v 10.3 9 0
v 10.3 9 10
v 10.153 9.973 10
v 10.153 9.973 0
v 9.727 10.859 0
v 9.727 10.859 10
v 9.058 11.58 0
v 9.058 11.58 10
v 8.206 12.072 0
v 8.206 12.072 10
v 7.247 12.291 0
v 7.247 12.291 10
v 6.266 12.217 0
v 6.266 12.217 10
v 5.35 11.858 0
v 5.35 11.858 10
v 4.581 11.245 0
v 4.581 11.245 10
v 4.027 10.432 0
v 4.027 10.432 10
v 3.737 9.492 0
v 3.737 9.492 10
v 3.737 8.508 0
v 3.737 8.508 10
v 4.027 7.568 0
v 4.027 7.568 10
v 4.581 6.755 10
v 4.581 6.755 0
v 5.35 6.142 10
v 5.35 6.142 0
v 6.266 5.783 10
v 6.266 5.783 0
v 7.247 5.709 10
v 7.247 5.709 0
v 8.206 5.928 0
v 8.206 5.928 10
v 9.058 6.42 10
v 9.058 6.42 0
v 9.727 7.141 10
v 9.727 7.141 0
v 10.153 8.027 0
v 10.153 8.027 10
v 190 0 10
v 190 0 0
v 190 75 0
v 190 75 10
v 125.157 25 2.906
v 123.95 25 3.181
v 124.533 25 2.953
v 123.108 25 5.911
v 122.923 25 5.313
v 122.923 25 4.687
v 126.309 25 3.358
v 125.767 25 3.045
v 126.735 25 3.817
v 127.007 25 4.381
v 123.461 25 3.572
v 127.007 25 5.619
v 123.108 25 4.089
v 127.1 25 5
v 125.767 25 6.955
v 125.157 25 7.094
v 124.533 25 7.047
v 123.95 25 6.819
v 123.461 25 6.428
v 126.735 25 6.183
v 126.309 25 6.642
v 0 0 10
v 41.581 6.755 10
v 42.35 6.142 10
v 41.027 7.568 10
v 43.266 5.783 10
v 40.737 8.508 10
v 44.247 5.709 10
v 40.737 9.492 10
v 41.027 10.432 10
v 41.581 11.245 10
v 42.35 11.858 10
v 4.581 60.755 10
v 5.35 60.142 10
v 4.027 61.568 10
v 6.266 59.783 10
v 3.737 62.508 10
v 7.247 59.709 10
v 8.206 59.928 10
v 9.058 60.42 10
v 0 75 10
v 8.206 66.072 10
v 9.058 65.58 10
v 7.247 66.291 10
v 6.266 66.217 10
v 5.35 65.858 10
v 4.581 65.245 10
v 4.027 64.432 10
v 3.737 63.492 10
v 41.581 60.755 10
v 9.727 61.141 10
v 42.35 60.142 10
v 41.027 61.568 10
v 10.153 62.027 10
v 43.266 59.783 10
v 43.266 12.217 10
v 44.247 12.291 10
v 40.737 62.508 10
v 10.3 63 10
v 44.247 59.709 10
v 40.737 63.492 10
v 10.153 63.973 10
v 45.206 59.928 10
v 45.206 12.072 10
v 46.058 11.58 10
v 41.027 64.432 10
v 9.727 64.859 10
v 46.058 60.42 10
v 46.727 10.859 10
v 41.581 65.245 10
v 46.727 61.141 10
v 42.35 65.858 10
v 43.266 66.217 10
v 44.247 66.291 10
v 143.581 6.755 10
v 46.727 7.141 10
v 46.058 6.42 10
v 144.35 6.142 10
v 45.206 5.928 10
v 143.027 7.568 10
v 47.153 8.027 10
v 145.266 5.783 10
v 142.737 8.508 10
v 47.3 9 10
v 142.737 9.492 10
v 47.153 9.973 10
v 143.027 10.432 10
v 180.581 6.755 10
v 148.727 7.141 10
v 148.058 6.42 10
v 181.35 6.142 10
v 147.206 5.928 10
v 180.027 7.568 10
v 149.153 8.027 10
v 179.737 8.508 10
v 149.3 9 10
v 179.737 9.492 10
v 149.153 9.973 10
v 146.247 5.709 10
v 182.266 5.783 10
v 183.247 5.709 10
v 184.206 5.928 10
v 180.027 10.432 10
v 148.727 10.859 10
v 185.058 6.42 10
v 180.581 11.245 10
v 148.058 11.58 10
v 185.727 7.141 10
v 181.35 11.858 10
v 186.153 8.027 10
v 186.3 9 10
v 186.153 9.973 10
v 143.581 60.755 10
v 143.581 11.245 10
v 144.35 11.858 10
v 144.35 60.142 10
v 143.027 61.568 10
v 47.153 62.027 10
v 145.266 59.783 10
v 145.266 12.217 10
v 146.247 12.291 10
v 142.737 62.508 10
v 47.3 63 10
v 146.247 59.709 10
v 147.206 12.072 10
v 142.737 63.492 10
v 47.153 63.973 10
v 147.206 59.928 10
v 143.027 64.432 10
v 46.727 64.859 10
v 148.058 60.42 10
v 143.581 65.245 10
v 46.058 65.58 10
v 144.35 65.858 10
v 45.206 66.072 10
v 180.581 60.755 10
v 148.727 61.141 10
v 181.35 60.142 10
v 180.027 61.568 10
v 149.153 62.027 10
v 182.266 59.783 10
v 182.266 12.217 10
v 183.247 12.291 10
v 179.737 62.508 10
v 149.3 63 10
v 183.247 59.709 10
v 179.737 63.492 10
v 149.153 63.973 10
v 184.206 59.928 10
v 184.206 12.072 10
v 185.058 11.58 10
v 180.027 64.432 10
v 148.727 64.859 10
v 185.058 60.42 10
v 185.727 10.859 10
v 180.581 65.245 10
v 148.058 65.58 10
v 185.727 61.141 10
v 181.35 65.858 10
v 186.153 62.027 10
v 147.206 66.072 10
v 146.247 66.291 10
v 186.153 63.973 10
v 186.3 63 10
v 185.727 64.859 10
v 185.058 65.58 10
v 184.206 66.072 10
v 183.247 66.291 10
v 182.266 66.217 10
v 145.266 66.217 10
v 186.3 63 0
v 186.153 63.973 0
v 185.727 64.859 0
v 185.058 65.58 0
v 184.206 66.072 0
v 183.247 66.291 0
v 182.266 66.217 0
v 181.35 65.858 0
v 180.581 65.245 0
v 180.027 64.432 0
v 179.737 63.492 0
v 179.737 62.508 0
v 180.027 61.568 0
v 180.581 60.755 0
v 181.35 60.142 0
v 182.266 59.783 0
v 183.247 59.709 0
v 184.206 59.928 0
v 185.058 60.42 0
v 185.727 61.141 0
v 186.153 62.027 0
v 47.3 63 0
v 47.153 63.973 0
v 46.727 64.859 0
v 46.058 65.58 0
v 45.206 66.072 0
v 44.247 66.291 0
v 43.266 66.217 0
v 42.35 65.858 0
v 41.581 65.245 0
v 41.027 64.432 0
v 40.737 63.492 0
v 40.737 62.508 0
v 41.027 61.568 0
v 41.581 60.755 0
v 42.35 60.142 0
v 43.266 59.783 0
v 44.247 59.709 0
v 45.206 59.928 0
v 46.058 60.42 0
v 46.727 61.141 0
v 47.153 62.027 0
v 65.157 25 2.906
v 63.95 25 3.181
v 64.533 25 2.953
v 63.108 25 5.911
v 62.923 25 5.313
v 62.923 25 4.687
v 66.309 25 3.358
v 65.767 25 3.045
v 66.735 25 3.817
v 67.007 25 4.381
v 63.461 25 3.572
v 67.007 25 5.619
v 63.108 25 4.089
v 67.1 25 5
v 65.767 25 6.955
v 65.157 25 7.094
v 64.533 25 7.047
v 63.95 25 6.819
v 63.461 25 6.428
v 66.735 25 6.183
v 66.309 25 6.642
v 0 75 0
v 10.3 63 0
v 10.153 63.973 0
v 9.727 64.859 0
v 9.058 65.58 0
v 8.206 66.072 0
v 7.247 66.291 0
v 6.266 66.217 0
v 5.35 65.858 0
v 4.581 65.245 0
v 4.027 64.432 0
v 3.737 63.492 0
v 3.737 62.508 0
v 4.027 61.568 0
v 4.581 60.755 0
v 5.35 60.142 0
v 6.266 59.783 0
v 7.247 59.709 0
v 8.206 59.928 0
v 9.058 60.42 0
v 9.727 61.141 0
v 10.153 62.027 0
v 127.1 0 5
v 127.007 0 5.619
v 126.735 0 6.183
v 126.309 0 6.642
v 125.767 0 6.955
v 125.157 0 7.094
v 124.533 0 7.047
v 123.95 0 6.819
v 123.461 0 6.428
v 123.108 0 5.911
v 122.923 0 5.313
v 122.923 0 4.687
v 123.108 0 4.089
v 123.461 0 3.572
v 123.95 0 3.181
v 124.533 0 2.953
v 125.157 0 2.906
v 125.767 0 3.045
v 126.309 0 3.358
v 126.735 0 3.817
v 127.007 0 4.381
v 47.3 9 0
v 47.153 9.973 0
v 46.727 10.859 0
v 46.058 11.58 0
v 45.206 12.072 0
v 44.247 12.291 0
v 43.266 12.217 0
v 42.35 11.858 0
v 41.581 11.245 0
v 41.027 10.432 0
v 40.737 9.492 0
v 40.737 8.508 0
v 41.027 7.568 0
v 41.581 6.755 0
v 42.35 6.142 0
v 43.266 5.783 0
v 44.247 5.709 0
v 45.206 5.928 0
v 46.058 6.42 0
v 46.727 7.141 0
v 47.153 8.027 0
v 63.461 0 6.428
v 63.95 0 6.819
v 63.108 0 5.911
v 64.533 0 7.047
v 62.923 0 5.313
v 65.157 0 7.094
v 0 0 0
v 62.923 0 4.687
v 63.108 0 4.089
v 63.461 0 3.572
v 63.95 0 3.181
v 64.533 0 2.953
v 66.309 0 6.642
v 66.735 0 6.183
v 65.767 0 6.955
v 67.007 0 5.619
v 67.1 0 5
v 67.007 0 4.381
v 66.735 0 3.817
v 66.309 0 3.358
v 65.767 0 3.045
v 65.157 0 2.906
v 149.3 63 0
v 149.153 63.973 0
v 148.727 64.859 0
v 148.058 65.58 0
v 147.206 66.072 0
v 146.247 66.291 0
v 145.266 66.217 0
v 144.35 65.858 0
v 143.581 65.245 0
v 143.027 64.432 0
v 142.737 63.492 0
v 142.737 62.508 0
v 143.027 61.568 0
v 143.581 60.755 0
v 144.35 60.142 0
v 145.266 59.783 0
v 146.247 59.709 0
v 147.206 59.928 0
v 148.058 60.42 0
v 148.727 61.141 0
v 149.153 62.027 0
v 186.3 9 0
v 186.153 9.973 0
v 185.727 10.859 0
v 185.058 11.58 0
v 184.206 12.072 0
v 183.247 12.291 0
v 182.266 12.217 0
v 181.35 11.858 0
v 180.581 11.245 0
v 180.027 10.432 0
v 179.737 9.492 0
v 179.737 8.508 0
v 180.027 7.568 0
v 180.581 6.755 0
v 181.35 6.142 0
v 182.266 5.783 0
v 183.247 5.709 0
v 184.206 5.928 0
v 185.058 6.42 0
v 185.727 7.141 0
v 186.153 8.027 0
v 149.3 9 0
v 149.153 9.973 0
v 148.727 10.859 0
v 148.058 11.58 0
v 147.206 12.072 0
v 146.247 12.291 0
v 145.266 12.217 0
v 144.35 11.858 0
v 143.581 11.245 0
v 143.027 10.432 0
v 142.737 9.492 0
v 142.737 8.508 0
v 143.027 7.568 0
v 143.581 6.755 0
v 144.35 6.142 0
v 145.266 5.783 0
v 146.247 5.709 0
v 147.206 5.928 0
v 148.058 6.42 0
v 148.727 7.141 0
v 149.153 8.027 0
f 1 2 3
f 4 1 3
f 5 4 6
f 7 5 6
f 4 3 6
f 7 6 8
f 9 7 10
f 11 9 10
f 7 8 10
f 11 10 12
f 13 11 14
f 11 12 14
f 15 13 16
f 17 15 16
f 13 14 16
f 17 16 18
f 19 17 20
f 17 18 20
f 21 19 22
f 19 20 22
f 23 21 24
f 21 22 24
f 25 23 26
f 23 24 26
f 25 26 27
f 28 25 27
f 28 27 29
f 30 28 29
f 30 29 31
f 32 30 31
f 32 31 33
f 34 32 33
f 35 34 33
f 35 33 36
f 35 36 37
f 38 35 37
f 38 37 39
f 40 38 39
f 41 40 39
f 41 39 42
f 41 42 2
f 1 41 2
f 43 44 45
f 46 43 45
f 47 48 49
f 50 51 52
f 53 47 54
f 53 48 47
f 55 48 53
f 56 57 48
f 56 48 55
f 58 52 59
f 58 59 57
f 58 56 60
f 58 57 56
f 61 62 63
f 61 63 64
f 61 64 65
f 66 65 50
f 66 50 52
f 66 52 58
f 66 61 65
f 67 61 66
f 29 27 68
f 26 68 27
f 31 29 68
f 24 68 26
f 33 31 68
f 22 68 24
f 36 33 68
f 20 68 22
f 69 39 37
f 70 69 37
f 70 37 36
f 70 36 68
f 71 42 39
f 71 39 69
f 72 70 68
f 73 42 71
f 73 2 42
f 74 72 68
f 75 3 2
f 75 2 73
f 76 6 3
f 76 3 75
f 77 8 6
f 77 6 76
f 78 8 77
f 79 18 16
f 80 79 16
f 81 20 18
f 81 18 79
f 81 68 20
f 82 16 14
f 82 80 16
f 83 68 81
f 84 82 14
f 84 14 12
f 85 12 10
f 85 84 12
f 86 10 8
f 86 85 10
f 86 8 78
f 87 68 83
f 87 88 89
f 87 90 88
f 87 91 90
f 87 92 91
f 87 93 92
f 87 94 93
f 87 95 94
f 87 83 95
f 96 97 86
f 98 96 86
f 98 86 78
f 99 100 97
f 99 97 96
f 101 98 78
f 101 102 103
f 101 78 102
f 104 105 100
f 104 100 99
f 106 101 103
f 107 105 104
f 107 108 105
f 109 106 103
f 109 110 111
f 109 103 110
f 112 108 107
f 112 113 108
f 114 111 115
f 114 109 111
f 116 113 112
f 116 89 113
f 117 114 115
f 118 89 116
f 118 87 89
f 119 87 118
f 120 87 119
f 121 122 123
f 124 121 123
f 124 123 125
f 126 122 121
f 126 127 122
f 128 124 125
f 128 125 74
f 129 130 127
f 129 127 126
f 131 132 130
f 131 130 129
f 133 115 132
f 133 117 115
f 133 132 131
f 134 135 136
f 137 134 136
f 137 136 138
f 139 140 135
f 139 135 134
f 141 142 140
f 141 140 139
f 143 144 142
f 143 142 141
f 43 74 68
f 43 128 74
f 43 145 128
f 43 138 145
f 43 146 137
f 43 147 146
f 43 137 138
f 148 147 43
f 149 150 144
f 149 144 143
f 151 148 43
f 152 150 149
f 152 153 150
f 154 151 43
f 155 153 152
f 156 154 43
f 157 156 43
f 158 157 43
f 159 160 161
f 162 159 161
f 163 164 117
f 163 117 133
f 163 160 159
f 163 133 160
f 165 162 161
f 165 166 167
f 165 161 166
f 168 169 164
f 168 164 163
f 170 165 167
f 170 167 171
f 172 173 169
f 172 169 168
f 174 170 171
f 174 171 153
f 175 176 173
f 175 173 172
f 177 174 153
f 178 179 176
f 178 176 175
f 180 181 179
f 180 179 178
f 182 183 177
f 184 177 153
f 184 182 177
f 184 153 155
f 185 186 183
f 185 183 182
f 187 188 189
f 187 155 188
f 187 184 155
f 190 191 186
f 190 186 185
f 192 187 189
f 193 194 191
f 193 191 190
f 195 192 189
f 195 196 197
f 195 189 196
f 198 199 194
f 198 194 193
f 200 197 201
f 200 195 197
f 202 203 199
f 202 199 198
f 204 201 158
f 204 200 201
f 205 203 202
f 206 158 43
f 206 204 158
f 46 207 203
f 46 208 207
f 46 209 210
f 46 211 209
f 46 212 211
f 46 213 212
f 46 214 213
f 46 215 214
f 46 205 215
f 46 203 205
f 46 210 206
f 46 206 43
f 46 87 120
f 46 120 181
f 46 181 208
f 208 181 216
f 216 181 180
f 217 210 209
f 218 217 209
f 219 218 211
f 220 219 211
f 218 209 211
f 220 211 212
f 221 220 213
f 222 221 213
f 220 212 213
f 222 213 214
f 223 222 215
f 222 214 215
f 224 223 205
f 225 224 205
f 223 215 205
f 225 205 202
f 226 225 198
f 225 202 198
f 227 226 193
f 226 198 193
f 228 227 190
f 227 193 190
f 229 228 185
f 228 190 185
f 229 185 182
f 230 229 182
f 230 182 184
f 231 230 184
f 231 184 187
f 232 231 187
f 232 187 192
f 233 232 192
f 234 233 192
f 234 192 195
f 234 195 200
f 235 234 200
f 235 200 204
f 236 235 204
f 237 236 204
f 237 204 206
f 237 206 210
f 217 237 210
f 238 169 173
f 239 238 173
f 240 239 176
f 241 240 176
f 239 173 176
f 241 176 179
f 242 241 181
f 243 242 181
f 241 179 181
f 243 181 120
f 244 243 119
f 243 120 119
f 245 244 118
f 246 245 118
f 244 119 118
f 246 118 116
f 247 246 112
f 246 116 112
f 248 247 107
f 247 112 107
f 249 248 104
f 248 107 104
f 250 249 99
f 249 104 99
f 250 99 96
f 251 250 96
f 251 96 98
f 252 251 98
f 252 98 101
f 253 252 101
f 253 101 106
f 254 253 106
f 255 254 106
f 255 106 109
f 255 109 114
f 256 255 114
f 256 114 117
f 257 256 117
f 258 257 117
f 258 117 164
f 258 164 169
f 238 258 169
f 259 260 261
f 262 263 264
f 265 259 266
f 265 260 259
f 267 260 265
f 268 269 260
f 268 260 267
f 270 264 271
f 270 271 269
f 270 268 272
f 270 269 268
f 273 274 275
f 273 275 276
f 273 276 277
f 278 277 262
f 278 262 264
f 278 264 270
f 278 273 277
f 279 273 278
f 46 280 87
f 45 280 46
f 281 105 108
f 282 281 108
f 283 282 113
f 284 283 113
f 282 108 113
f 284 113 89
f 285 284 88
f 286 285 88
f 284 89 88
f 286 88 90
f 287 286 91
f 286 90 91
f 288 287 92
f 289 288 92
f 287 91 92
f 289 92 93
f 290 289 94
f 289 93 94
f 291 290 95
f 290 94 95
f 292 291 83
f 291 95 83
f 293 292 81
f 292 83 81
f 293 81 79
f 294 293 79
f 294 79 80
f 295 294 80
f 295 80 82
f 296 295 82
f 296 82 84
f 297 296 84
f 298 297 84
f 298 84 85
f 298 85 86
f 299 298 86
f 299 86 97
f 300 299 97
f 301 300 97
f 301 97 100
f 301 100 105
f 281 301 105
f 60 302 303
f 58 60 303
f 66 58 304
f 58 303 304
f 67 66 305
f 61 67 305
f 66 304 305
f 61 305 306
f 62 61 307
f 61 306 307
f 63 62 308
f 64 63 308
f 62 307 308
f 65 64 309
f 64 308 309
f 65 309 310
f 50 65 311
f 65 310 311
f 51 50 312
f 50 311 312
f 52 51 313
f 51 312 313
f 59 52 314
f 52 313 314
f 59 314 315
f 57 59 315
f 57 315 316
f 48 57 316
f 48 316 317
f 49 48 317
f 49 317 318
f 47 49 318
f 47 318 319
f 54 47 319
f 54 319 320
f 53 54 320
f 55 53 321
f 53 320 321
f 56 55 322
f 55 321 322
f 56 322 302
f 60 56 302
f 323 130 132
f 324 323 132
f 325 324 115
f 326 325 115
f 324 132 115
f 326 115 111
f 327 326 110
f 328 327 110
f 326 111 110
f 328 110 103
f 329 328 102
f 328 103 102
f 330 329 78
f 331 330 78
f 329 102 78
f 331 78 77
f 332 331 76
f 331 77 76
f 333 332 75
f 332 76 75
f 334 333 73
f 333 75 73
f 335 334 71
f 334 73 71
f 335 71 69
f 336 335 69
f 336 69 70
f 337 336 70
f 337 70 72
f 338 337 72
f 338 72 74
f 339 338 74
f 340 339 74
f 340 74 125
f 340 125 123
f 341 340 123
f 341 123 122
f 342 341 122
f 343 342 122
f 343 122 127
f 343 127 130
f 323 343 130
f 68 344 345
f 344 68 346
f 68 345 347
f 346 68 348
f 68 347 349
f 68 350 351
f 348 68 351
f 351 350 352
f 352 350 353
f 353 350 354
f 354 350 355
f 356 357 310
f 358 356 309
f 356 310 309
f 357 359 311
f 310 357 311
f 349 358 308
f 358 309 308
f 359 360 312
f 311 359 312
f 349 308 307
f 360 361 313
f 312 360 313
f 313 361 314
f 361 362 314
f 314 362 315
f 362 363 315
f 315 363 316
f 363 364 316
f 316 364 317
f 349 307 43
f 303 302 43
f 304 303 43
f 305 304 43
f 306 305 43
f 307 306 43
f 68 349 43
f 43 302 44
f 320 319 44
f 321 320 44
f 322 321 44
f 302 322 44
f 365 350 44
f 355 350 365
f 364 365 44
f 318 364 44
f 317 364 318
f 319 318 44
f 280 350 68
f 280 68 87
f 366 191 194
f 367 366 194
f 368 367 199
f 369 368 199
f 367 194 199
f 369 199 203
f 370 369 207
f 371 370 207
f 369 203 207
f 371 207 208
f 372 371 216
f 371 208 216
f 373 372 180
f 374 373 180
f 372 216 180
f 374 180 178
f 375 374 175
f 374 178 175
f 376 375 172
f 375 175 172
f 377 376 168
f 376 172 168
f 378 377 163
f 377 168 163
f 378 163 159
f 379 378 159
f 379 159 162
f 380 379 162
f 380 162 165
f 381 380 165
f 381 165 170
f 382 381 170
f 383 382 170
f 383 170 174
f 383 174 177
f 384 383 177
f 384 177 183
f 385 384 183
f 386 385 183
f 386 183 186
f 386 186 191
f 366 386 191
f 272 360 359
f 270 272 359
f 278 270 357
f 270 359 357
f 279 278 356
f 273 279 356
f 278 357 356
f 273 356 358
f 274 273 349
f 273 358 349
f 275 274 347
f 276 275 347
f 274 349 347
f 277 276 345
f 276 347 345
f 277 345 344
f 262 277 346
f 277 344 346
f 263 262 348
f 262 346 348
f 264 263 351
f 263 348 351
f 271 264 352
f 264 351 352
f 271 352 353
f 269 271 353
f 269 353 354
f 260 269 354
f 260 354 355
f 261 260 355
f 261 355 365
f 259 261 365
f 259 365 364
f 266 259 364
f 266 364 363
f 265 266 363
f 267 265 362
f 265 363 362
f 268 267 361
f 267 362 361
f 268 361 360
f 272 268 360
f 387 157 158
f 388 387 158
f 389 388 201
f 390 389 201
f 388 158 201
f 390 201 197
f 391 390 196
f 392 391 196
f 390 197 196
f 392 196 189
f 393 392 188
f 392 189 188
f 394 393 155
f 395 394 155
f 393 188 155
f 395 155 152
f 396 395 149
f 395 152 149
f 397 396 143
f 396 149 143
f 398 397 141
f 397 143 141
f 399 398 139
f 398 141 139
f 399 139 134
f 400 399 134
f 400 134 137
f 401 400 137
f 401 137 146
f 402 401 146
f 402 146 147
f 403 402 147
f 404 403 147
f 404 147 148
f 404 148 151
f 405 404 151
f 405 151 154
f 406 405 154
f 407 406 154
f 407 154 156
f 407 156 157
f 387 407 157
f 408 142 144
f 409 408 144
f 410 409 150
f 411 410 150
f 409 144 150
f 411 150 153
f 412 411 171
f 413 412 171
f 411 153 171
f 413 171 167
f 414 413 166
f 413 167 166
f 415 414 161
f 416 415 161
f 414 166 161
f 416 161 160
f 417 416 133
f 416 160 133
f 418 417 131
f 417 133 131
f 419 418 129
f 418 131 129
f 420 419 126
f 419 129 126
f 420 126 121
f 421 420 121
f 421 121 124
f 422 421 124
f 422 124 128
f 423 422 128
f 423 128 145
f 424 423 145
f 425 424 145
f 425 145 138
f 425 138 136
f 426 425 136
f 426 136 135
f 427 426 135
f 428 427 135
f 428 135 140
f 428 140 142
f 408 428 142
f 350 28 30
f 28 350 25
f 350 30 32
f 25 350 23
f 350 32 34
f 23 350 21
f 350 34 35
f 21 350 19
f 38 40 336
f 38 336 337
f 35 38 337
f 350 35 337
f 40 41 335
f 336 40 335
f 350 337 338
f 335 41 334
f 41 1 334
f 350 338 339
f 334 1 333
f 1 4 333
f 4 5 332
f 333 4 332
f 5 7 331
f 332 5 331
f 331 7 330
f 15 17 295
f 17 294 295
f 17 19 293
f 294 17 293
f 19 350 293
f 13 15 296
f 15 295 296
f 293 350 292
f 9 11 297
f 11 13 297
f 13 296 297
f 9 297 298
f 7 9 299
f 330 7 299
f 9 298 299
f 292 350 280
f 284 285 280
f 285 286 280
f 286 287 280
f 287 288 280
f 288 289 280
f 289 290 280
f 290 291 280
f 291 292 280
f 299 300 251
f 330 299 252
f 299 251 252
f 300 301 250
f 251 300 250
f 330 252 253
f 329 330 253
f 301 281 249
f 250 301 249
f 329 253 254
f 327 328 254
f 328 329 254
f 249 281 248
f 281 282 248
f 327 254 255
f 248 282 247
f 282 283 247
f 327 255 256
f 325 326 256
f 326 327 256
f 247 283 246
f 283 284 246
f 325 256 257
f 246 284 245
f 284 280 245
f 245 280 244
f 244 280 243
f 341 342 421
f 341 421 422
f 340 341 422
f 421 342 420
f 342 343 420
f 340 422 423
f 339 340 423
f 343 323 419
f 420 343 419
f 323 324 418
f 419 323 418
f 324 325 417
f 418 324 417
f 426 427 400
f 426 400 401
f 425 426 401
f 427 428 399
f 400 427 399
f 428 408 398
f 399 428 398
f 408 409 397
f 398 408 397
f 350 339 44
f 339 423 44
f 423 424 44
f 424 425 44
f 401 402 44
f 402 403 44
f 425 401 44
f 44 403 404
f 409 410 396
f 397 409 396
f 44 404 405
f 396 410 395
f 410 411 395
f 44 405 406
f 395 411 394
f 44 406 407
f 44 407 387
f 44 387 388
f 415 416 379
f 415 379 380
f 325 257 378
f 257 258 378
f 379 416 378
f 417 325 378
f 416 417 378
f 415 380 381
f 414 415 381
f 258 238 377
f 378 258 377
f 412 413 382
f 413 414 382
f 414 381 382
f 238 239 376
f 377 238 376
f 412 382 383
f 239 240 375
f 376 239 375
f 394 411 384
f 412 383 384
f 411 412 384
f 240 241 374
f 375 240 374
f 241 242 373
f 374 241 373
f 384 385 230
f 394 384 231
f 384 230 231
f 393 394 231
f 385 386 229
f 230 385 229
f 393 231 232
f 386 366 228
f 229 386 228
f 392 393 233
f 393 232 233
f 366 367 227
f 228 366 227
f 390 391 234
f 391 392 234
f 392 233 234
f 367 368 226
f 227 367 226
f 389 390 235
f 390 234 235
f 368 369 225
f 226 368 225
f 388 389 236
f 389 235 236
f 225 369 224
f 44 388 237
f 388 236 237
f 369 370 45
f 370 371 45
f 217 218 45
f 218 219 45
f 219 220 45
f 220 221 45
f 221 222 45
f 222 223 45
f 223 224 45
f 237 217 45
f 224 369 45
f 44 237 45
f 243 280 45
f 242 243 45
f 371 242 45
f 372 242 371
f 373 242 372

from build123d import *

# Parameters (mm, degrees)
SKETCH_W               = 190
SKETCH_H               = 75
PAD_DEPTH              = 10
SKETCH001_R            = 3.3
HOLE_DEPTH             = 10.001
LINEARPATTERN_COUNT    = 2
LINEARPATTERN_PITCH    = 37
LINEARPATTERN001_COUNT = 2
LINEARPATTERN001_PITCH = 139
LINEARPATTERN002_COUNT = 2
LINEARPATTERN002_PITCH = 176
SKETCH002_R            = 3.3
HOLE001_DEPTH          = 10.001
LINEARPATTERN003_COUNT = 2
LINEARPATTERN003_PITCH = 37
LINEARPATTERN004_COUNT = 2
LINEARPATTERN004_PITCH = 139
LINEARPATTERN005_COUNT = 2
LINEARPATTERN005_PITCH = 176
SKETCH003_R            = 2.1
HOLE002_DEPTH          = 25
LINEARPATTERN006_COUNT = 2
LINEARPATTERN006_PITCH = 60


with BuildPart() as part:
    # Sketch → Pad (new body)
    with BuildSketch(Plane.XY):
        with Locations((95, 37.5)):
            Rectangle(SKETCH_W, SKETCH_H)
    extrude(amount=PAD_DEPTH)

    # Sketch001 (on Face6 of Pad) → Hole (cut, through all)
    with BuildSketch(Plane.XY.offset(10)):
        with Locations((7, 9)):
            Circle(SKETCH001_R)
    hole = extrude(amount=-HOLE_DEPTH, mode=Mode.SUBTRACT)

    # LinearPattern: Hole ×2
    with Locations(*[(i * LINEARPATTERN_PITCH, 0, 0) for i in range(1, LINEARPATTERN_COUNT)]):
        add(hole, mode=Mode.SUBTRACT)

    # LinearPattern001: Hole ×2
    with Locations(*[(i * LINEARPATTERN001_PITCH, 0, 0) for i in range(1, LINEARPATTERN001_COUNT)]):
        add(hole, mode=Mode.SUBTRACT)

    # LinearPattern002: Hole ×2
    with Locations(*[(i * LINEARPATTERN002_PITCH, 0, 0) for i in range(1, LINEARPATTERN002_COUNT)]):
        add(hole, mode=Mode.SUBTRACT)

    # Sketch002 (on Face5 of LinearPattern002) → Hole001 (cut, through all)
    with BuildSketch(Plane.XY.offset(10)):
        with Locations((7, 63)):
            Circle(SKETCH002_R)
    hole001 = extrude(amount=-HOLE001_DEPTH, mode=Mode.SUBTRACT)

    # LinearPattern003: Hole001 ×2
    with Locations(*[(i * LINEARPATTERN003_PITCH, 0, 0) for i in range(1, LINEARPATTERN003_COUNT)]):
        add(hole001, mode=Mode.SUBTRACT)

    # LinearPattern004: Hole001 ×2
    with Locations(*[(i * LINEARPATTERN004_PITCH, 0, 0) for i in range(1, LINEARPATTERN004_COUNT)]):
        add(hole001, mode=Mode.SUBTRACT)

    # LinearPattern005: Hole001 ×2
    with Locations(*[(i * LINEARPATTERN005_PITCH, 0, 0) for i in range(1, LINEARPATTERN005_COUNT)]):
        add(hole001, mode=Mode.SUBTRACT)

    # Sketch003 (on Face1 of LinearPattern005) → Hole002 (cut)
    with BuildSketch(Plane.XZ):
        with Locations((65, 5)):
            Circle(SKETCH003_R)
    hole002 = extrude(amount=-HOLE002_DEPTH, mode=Mode.SUBTRACT)

    # LinearPattern006: Hole002 ×2
    with Locations(*[(i * LINEARPATTERN006_PITCH, 0, 0) for i in range(1, LINEARPATTERN006_COUNT)]):
        add(hole002, mode=Mode.SUBTRACT)


solid = part.part
